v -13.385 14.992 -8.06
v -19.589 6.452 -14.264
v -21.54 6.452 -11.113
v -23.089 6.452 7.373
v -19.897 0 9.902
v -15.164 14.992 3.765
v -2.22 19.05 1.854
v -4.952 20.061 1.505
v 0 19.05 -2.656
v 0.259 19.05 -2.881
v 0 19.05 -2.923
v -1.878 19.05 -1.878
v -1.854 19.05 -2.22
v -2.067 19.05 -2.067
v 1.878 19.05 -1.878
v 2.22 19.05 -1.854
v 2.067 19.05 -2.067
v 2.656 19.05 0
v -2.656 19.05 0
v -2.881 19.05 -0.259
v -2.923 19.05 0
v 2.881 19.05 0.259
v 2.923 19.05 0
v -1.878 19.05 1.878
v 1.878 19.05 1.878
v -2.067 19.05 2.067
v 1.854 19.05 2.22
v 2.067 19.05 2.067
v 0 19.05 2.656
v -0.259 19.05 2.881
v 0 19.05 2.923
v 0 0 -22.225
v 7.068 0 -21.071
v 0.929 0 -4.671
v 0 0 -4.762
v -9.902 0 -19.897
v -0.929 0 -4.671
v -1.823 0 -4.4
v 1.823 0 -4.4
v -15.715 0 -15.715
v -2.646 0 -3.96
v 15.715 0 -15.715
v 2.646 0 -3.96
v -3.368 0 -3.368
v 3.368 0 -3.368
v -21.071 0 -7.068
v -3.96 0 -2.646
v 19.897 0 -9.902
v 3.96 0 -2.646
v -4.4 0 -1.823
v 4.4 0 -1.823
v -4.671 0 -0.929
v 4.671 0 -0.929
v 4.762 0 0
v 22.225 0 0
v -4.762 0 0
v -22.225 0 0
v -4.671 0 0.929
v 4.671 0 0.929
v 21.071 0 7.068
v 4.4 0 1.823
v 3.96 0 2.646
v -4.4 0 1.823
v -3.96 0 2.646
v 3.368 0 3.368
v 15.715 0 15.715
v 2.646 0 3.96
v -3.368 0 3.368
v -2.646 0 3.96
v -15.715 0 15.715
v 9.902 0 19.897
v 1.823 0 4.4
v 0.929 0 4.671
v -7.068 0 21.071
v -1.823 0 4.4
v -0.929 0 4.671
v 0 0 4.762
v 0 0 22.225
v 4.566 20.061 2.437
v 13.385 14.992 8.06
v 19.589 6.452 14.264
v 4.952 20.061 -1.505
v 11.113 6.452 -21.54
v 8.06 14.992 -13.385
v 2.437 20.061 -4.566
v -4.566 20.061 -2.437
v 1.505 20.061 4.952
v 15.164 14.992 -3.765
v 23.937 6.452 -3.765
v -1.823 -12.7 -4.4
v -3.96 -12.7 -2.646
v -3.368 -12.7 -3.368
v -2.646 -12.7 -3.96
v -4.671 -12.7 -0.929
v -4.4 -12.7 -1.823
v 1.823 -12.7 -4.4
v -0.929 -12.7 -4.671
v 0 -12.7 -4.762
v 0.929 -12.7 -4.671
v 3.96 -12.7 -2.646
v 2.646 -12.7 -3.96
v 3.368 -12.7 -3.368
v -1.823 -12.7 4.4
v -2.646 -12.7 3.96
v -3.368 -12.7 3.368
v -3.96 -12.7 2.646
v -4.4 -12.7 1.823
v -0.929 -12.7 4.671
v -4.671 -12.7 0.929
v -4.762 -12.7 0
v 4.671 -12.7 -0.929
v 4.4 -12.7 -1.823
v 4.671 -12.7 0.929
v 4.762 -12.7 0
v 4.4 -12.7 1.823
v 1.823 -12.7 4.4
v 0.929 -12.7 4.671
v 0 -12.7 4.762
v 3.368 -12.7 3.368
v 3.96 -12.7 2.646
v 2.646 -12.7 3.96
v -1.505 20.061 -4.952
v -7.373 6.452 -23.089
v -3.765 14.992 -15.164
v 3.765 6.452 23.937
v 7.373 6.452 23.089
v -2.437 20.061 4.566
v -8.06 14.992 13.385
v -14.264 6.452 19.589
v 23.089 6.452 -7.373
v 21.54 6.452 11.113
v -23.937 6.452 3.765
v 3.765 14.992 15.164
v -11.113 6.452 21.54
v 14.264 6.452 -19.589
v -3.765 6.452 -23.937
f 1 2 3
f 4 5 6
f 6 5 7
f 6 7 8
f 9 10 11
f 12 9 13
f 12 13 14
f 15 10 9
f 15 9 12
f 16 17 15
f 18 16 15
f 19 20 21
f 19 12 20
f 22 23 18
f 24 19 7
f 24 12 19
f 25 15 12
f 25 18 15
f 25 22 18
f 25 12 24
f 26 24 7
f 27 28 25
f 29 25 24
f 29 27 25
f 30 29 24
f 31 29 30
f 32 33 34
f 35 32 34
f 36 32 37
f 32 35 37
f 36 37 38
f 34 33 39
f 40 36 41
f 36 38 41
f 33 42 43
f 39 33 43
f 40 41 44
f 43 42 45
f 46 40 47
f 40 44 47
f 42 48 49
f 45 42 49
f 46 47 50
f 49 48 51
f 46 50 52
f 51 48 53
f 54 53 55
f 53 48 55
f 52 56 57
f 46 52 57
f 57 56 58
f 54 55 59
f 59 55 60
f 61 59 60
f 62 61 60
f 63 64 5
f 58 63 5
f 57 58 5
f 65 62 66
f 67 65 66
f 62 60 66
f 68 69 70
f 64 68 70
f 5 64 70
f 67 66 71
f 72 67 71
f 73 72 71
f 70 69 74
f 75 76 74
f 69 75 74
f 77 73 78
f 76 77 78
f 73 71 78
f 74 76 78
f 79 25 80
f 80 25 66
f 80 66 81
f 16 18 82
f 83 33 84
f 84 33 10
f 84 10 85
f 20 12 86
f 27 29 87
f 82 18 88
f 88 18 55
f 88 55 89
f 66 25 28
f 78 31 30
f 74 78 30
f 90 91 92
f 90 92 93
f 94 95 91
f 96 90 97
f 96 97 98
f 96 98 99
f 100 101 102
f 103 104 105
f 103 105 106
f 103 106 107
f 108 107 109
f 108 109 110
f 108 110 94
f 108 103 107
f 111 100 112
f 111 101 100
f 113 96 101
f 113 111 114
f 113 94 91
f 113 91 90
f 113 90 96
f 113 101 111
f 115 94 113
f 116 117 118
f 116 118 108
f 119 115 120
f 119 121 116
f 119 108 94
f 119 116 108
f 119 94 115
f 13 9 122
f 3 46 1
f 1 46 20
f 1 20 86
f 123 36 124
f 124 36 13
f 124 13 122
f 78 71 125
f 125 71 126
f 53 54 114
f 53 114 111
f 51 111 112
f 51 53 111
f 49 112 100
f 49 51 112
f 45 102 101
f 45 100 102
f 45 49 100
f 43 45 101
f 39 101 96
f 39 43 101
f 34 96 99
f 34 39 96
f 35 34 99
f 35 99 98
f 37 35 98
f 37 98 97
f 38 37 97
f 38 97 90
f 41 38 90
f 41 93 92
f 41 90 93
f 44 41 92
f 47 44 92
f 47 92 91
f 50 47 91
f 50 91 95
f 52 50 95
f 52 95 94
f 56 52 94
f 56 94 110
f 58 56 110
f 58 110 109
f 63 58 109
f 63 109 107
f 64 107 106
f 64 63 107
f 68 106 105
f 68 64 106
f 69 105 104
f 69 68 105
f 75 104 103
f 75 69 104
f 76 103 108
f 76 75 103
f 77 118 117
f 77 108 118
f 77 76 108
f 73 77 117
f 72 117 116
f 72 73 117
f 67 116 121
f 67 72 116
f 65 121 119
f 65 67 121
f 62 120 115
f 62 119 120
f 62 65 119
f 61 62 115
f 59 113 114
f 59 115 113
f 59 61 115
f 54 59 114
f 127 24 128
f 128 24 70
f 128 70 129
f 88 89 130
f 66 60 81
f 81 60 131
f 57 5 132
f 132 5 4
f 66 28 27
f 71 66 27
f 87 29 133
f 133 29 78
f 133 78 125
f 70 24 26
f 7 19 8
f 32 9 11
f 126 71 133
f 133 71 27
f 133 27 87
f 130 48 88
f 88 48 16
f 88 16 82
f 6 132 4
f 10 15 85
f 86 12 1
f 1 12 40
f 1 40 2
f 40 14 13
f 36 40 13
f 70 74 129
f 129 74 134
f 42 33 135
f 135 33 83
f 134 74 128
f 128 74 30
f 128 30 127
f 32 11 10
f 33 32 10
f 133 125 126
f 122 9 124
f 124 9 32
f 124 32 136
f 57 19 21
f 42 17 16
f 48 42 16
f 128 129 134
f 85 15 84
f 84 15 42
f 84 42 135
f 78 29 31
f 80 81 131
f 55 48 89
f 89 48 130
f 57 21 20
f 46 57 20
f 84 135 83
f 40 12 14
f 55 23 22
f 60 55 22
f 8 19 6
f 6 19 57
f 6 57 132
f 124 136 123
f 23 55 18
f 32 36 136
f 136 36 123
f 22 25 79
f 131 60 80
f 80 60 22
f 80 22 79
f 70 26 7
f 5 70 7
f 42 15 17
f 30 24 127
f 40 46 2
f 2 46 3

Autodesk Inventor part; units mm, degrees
ref_plane "YZ Plane" through (0, 0, 0) normal (1, 0, 0) x (0, 1, 0)
ref_plane "XZ Plane" through (0, 0, 0) normal (0, 1, 0) x (-1, 0, 0)
ref_plane "XY Plane" through (0, 0, 0) normal (0, 0, 1) x (1, 0, 0)
sketch "Sketch7" plane through (0, 0, 0) normal (0, 1, 0) x (-1, 0, 0)
  line L0 (0, 0) -> (-22.225, 0)
  line L1 (0, 0) -> (-15.7154, -15.7154) construction
  line L2 (0, 0) -> (-22.225, 0) construction
  line L3 (-22.225, 0) -> (-19.8975, -9.9016)
  line L4 (-19.8975, -9.9016) -> (-15.7154, -15.7154)
  line L5 (-15.7154, -15.7154) -> (0, 0)
  dimension "d25" = 22.225
  dimension "d26" = 45
extrude "Extrusion6" add sketch "Sketch7" along normal blind 19.05
chamfer "Chamfer2" distance 19.05 angle 45 2 edges at (17.8065, 19.05, -12.8085) (21.0612, 19.05, -4.9508)
pattern_circular "Circular Pattern3" count 8 over 360 about axis through (0, 0, 0) along (0, 1, 0) of "Extrusion6", "Chamfer2"
sketch "Sketch8" plane through (-15.7154, 0, -15.7154) normal (-0.6011477, 0.7071068, -0.372319) x (0.5066767, 0.6975367, 0.5066767)
  line L0 (0, 0) -> (1.6678, -10.0338)
  line L1 (1.6678, -10.0338) -> (27.6226, -1.8784)
  line L2 (27.6226, -1.8784) -> (1.6678, -10.0338) projected
  line L3 (27.6226, -1.8784) -> (27.3104, 0)
  line L4 (27.3104, 0) -> (0, 0)
  line L5 (0, 0) -> (27.3104, 0) projected
  point P0 (15.9253, -2.5084)
extrude "Extrusion7" add sketch "Sketch8" along normal blind 6.35 draft -23.6
sketch "Sketch9" plane through (0, 0, 0) normal (0, -1, 0) x (1, 0, 0)
  circle A0 centre (0, 0) radius 4.7625
  dimension "d37" = 9.525
extrude "Extrusion8" add sketch "Sketch9" along normal blind 12.7
pattern_circular "Circular Pattern4" count 8 over 360 about axis through (0, 0, 0) along (0, -1, 0) of "Extrusion7"
properties part number "Beveled_Gear"
